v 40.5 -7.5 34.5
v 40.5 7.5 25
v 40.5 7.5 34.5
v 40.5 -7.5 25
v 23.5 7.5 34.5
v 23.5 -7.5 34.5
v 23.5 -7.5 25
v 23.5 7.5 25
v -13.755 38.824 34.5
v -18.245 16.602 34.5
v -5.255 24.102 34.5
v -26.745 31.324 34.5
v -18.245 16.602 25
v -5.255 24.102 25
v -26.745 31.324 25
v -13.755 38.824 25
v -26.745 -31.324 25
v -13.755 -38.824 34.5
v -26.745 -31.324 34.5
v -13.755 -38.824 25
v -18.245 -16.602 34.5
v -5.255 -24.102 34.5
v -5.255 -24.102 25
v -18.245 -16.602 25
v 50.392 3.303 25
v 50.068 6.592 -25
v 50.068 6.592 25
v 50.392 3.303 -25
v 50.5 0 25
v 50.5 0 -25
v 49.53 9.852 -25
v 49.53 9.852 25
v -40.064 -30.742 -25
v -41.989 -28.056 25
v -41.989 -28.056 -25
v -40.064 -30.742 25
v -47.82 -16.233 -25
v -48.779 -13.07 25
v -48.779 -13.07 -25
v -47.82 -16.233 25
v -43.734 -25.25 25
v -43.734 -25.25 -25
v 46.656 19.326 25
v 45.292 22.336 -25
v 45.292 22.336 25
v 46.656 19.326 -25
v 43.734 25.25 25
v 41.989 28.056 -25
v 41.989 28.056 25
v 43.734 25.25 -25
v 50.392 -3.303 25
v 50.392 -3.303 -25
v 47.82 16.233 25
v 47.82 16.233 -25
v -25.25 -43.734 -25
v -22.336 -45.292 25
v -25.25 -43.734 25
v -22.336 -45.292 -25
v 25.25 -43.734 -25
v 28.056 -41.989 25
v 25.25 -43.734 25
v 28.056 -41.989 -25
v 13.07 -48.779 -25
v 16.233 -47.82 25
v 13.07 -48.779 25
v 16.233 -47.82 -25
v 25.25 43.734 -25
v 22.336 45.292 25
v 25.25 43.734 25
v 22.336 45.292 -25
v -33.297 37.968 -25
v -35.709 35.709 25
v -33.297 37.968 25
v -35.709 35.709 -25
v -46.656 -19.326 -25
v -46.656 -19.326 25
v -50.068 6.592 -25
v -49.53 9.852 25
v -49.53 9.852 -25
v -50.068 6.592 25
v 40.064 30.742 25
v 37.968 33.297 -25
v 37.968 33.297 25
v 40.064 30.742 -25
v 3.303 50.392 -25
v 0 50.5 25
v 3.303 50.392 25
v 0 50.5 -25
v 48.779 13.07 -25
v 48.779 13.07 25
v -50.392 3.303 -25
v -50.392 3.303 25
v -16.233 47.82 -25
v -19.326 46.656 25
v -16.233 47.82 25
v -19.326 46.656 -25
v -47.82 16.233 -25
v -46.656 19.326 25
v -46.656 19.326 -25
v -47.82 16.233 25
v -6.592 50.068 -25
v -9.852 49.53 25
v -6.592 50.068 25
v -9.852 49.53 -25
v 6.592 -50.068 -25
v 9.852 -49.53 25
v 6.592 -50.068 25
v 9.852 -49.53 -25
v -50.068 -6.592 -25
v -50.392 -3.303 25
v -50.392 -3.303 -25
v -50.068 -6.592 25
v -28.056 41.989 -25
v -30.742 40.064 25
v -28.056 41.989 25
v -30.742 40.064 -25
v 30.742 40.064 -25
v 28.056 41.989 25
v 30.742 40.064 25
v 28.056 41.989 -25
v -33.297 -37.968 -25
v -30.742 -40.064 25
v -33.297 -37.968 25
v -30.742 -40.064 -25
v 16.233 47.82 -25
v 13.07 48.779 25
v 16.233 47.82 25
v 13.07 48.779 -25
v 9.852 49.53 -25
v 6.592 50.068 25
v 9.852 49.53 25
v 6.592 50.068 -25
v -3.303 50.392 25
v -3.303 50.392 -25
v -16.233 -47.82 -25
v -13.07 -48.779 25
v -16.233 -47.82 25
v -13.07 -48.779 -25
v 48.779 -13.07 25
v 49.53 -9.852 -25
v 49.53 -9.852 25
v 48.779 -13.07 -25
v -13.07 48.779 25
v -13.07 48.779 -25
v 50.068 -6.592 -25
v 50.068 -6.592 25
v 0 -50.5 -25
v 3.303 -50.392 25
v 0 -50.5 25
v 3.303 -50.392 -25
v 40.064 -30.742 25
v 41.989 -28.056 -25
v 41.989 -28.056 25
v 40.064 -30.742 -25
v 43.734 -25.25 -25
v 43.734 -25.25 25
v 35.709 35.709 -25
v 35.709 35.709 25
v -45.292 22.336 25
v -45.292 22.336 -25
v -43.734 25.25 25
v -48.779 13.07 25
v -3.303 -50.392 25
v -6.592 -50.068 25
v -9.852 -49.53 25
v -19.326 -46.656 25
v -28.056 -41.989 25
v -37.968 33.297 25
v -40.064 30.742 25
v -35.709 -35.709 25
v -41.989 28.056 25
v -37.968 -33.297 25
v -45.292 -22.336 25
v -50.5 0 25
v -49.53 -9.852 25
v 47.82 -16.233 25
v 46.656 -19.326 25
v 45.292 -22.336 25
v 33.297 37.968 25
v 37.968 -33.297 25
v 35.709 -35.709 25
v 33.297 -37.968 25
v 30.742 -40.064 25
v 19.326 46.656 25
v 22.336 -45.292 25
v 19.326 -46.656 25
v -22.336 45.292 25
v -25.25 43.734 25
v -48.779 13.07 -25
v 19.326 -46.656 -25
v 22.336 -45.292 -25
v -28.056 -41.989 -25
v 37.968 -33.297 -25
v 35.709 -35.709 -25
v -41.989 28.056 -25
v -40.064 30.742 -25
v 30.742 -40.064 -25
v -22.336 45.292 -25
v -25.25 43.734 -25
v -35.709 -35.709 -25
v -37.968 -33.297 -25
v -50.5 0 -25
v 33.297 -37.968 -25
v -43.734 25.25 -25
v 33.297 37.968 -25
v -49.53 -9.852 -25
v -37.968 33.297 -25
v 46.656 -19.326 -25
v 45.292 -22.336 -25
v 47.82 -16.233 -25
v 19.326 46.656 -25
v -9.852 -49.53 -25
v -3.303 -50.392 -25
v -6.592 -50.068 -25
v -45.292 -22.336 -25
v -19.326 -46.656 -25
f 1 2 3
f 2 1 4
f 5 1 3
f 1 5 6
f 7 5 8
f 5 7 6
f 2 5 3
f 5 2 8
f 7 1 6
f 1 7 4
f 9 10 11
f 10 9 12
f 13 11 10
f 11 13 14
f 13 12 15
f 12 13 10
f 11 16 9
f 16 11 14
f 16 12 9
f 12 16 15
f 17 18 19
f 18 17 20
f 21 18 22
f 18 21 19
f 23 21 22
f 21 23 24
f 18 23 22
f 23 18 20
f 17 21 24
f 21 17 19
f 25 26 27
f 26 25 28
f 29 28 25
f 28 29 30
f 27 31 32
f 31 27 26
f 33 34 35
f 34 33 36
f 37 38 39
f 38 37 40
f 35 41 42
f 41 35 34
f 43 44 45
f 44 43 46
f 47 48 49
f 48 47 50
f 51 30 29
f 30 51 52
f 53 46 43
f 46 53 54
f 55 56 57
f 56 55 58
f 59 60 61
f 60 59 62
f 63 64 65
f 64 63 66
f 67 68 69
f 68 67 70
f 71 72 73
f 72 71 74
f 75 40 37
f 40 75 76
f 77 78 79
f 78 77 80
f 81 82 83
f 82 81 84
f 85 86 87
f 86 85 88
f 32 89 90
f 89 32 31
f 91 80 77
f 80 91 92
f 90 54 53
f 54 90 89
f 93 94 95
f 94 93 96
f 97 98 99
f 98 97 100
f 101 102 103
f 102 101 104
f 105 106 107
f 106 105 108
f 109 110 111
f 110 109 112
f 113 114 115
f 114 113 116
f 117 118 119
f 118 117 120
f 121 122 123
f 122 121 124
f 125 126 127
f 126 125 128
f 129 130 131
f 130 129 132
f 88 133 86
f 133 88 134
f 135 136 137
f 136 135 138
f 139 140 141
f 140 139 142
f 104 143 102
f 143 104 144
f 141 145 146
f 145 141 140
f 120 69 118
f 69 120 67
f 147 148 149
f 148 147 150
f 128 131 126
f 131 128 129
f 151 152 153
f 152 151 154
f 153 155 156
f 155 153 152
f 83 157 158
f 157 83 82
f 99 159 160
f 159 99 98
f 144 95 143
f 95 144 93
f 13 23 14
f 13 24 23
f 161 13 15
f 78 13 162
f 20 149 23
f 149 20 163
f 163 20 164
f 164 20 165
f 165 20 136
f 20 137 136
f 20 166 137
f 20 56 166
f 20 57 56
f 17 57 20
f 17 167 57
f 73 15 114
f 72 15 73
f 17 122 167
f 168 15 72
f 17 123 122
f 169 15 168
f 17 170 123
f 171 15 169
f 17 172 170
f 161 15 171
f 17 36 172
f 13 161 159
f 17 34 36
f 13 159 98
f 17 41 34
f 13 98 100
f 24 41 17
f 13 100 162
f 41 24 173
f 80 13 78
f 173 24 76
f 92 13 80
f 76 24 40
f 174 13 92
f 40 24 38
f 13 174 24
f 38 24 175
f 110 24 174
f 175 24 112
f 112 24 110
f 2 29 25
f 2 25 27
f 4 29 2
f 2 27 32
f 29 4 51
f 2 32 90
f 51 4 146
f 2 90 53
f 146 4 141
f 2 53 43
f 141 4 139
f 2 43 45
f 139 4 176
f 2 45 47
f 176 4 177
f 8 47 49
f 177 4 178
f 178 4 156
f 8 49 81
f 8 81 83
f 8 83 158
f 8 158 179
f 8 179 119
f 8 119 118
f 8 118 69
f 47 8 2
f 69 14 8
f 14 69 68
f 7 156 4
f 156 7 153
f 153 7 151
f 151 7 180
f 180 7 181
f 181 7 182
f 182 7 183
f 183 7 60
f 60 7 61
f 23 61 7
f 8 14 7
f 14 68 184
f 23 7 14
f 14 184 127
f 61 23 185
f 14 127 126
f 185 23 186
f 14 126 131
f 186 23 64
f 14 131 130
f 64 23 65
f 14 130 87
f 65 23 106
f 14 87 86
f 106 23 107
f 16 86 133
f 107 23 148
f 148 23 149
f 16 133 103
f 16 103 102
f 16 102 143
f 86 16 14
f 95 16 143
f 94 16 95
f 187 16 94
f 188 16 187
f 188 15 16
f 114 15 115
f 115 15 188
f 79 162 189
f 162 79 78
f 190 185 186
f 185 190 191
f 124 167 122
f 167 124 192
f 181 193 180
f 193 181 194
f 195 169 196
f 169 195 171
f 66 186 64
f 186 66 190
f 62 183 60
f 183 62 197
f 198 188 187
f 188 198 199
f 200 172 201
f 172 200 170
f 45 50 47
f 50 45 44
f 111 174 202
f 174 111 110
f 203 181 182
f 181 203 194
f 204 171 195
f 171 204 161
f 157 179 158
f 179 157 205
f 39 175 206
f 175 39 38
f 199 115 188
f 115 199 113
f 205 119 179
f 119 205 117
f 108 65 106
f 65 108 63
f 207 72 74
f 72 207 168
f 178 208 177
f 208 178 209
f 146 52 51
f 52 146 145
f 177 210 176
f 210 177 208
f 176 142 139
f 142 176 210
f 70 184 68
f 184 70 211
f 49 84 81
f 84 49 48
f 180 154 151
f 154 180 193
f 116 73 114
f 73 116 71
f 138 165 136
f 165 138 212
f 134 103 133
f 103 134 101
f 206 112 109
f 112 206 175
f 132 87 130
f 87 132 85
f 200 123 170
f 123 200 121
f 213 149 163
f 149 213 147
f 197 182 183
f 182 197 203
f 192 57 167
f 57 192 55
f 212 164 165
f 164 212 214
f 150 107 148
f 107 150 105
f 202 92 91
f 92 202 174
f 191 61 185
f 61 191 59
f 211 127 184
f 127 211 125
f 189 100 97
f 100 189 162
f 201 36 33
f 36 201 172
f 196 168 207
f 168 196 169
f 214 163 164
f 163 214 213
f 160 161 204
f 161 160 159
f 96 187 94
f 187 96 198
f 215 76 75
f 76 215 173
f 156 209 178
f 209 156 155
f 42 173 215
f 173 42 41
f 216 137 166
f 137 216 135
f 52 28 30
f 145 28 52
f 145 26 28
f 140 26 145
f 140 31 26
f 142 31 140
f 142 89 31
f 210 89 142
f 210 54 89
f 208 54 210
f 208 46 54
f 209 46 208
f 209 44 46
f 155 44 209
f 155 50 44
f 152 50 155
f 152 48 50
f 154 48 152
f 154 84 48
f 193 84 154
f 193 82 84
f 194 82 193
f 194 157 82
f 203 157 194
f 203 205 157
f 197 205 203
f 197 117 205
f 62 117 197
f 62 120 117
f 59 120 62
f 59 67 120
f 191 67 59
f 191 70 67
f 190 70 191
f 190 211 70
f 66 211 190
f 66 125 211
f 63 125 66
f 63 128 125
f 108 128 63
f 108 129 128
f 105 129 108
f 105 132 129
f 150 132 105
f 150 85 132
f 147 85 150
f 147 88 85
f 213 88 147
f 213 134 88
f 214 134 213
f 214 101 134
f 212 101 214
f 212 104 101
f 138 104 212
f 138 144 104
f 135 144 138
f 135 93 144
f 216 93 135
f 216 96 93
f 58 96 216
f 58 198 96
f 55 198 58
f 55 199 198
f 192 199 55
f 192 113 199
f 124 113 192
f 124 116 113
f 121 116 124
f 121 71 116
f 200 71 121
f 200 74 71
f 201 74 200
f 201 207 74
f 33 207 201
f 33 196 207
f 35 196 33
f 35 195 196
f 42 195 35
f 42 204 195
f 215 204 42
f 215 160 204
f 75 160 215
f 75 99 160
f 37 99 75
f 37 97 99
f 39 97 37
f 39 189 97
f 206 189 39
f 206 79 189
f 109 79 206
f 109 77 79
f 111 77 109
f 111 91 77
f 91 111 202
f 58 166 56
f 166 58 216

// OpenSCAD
// Inert bench display, dimensions in millimetres.
// Export one selectable part at a time. No interface to an industrial spindle.
part = "chuck_display";
$fn = 96;
module chuck_display() {
    union() {
        cylinder(h=50,d=101,center=true);
        for (a=[0,120,240])
            rotate([0,0,a]) translate([32,0,26]) cube([17,15,17],center=true);
    }
}
module tray() {
    union() {
        cube([85,83,41],center=true);
        for (y=[-40,40])
            translate([0,y,25]) cube([87,5,12],center=true);
        for (x=[-40,40])
            translate([x,0,26.5]) cube([5,79,15],center=true);
    }
}
// Paint template for the flat face. Align zero with the upward datum.
// The matching rim stripes are 48 mm long and centered on the same angles.
module face_indices() {
    for (p=[[12,17,38],[141,10,24]])
        rotate([0,0,-p[0]]) translate([0,47-p[2]/2,0]) square([p[1],p[2]],center=true);
}
if (part=="face_indices") face_indices();
if (part=="chuck_display") chuck_display();
if (part=="tray") tray();

// Moving cap on the isolated instrument pad. Inside faces are 27 by 30 mm.
module service_pad() {
    union() {
        cube([40,40,12], center=true);
        for (x=[-14.5,14.5])
            translate([x,0,8]) cube([2,34,4], center=true);
        for (y=[-16,16])
            translate([0,y,8]) cube([27,2,4], center=true);
    }
}
if (part=="service_pad") service_pad();
